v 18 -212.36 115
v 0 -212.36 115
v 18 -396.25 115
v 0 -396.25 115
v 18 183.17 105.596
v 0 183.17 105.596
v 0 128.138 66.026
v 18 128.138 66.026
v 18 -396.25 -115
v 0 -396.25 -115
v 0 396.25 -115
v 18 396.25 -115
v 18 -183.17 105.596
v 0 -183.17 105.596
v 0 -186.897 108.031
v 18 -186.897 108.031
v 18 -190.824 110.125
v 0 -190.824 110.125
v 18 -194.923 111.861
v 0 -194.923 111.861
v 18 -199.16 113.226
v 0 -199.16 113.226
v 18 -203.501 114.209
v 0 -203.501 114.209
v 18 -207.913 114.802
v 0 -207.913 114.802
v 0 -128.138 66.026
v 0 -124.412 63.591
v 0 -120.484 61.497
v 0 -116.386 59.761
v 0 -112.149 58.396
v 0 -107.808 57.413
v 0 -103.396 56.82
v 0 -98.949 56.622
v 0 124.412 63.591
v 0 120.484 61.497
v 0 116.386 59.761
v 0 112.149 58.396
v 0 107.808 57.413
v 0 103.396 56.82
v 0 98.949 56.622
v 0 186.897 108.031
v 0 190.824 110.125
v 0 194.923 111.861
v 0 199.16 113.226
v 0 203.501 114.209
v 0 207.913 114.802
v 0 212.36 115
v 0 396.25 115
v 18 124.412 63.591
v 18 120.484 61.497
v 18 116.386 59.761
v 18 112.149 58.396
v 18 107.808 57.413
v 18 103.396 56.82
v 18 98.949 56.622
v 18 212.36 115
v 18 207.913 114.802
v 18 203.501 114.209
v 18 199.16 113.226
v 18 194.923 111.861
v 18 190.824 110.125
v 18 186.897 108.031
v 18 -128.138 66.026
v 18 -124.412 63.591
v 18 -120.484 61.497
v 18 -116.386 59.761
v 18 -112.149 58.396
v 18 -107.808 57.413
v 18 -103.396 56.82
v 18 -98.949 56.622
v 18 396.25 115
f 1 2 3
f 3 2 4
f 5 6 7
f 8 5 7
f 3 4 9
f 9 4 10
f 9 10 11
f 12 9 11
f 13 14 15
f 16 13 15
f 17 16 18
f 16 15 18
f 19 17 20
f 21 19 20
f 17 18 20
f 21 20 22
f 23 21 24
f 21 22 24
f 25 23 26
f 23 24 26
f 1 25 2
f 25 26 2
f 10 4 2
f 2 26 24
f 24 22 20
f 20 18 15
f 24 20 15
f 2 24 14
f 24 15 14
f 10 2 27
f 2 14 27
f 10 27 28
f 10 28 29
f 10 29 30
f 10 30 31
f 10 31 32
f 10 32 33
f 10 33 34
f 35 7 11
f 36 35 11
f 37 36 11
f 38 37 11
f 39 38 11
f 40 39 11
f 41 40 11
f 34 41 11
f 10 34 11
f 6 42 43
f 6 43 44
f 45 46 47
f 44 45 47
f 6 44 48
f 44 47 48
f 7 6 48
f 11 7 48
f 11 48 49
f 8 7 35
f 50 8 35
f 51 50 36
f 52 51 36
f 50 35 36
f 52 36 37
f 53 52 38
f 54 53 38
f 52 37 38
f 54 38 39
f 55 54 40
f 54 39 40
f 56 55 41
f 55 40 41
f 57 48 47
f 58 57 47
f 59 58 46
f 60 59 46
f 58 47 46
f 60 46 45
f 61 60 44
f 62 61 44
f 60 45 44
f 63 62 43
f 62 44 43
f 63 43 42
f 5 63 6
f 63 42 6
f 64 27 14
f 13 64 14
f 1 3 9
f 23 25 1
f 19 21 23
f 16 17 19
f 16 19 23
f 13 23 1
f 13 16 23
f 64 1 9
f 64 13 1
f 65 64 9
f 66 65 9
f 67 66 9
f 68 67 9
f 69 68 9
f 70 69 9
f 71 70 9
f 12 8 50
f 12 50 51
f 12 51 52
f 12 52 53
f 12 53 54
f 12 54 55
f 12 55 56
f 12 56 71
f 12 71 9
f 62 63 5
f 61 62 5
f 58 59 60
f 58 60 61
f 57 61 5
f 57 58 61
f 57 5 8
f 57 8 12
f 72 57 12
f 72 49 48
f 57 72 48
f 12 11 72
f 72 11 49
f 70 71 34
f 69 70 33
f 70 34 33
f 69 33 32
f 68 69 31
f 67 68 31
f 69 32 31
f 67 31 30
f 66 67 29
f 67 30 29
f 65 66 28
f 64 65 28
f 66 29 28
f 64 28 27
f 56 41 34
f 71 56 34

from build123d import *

# Parameters (mm, degrees)
F1_DEPTH = 18


with BuildPart() as f1:
    # F0 (on Right) → F1 (new body)
    with BuildSketch(Plane.YZ):
        with BuildLine():
            Line((396.25, -115), (396.25, 115))
            Line((396.25, 115), (212.359541, 115))
            ThreePointArc((212.359541, 115), (197.026206, 112.590849), (183.170485, 105.595555))
            Line((183.170485, 105.595555), (128.138406, 66.026335))
            ThreePointArc((128.138406, 66.026335), (114.282684, 59.031041), (98.94935, 56.621889))
            Line((98.94935, 56.621889), (-98.94935, 56.621889))
            ThreePointArc((-98.94935, 56.621889), (-114.282684, 59.031041), (-128.138406, 66.026335))
            Line((-128.138406, 66.026335), (-183.170485, 105.595555))
            ThreePointArc((-183.170485, 105.595555), (-197.026206, 112.590849), (-212.359541, 115))
            Line((-212.359541, 115), (-396.25, 115))
            Line((-396.25, 115), (-396.25, -115))
            Line((-396.25, -115), (396.25, -115))
        make_face()
    extrude(amount=F1_DEPTH)


solid = f1.part
